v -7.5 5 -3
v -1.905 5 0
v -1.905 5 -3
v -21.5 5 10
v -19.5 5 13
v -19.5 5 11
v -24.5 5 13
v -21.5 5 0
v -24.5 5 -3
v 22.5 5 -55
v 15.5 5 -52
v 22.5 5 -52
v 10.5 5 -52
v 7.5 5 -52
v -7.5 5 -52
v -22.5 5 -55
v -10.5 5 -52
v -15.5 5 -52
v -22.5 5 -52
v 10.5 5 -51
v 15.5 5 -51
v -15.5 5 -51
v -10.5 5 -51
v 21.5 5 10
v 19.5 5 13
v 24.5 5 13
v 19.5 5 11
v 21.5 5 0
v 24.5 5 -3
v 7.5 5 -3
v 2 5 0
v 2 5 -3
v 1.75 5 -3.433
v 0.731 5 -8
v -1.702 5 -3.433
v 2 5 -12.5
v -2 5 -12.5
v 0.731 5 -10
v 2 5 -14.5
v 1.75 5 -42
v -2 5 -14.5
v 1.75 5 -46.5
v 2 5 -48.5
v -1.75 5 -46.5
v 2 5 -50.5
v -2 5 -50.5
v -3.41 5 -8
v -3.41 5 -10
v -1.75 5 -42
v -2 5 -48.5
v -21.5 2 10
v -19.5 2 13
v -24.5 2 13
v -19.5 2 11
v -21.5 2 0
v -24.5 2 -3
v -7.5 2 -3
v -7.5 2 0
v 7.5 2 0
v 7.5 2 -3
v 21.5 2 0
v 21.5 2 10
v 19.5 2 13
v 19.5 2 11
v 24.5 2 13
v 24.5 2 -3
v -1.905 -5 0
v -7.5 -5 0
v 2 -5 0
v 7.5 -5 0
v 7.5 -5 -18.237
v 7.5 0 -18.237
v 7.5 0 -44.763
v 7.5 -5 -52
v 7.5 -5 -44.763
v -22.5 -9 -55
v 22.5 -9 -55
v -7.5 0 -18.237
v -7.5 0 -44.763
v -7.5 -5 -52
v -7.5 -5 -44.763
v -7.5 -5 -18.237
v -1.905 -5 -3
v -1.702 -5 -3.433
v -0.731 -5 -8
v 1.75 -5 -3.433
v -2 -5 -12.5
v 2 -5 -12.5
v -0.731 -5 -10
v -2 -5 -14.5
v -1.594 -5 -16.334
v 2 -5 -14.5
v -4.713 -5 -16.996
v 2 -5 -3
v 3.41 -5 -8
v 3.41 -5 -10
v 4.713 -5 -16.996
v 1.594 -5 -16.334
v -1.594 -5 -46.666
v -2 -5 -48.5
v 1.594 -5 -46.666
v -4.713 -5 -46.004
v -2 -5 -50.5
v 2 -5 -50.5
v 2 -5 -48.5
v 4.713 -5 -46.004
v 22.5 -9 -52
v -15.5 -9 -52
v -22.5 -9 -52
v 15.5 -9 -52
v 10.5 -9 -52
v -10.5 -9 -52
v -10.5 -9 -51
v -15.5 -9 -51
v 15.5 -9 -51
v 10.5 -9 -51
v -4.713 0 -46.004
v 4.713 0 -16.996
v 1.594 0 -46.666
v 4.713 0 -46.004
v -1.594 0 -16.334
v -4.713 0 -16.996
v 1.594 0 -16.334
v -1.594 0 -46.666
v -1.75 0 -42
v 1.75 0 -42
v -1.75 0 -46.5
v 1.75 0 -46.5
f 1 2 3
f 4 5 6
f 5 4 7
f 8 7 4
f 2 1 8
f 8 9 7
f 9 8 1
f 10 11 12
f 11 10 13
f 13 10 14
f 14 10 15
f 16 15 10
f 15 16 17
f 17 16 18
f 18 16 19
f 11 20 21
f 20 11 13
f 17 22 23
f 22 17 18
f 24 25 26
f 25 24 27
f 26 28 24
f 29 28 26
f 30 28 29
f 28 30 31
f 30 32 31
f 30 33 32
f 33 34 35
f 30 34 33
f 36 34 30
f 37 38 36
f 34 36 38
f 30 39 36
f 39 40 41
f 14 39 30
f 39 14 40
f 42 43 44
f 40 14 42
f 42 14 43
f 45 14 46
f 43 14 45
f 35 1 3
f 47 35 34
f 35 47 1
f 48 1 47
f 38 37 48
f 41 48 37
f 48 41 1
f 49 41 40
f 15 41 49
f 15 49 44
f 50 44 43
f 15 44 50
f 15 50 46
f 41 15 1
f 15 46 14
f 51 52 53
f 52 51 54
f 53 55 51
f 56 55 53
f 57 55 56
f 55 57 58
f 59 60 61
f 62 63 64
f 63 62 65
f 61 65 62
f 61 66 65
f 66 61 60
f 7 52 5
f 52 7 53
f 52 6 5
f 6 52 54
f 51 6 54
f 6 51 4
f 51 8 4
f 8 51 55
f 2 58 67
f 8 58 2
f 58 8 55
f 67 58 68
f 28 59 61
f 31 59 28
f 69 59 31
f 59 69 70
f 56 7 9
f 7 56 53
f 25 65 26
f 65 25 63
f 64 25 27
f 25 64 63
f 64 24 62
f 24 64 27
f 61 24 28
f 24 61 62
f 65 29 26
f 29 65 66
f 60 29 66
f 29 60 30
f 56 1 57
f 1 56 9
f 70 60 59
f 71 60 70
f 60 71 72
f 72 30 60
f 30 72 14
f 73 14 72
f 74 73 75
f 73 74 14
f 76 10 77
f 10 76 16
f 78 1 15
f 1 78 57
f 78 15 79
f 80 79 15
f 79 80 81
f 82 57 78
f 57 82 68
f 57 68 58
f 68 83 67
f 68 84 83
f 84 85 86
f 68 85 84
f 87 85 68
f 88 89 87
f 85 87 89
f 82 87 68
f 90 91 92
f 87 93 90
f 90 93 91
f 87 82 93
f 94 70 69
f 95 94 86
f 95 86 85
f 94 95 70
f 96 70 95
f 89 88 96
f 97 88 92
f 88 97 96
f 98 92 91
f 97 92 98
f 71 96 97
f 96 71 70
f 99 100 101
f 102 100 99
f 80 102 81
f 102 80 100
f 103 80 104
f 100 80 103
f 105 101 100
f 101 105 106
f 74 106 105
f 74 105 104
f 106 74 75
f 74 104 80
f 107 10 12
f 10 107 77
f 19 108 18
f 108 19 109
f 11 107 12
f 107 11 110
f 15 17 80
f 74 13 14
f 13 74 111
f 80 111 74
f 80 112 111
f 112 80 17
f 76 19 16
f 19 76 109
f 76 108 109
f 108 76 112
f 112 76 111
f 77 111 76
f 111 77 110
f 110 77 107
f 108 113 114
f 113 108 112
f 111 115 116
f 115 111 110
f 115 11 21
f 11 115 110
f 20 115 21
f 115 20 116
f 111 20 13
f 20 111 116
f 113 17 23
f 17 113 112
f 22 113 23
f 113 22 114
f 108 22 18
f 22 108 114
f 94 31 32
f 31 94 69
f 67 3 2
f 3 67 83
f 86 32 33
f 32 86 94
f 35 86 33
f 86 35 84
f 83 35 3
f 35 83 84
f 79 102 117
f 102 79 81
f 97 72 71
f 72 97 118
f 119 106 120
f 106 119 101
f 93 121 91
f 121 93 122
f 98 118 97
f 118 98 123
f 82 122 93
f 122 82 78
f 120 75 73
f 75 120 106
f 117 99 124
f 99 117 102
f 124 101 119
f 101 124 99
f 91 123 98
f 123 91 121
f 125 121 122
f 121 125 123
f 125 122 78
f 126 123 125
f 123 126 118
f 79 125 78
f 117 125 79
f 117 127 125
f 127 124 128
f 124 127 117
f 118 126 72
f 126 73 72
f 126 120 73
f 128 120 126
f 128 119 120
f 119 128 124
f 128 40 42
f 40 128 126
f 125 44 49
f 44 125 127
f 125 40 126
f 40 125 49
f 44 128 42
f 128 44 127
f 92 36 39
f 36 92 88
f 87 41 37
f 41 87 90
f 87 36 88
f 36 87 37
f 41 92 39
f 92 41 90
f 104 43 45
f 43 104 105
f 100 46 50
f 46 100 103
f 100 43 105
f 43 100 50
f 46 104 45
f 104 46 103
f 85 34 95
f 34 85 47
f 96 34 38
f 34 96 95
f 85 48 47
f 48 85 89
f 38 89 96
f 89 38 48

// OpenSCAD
module compass(){
	translate([-43/2,-43/2,0])
		cube([43,43,10]);
	translate([-38/2,-38/2,0])
		cube([38,38,15]);
}
module buegel(){
	mirror([1,0,0])
		halter();
	halter();
	translate([49/-2,3/-2,-3])
		cube([49,3,3]);	//difference(){
	//	translate([50/-2,3/-2,-2.5])
	//		cube([50,3,15]);
	//	compass();
	//}
}
module buegel_quer(){
	rotate([0,0,90])
		buegel();
	translate([0,0,-3+0.01])
		rotate([90,0,90])
			translate([0,0,-1.5])
			linear_extrude(height=3)
				polygon([[-4,0],[4,0],[0,-3],[4,0]]);
}

module buzzer(){
	cylinder(r=30.5/2,h=5.2);
	translate([3.5/-2,-15,-15+0.01])
		cube([3.5,4.5,15]);
	translate([-2,17,-20])
		cube([4,2,40]);
	translate([-2,-19,-20])
		cube([4,2,40]);

}

module stand(h){
	difference(){
		union(){
			translate([15/-2,10/-2,-h])
				cube([15,10,h]);
			translate([0,3.5,0])
				buegel();
			translate([45/-2,10/2-14,-h])
				cube([45,14,3]);
			translate([15/2+3,10/2-14,-h+2])
				cube([5,14,2]);
			translate([15/-2-3-5,10/2-14,-h+2])
				cube([5,14,2]);
		}
		minkowski(){
			buegel_quer();
			sphere(r=0.5);
		}
		rotate([0,0,15])
			translate([4/-2,40/-2,-10])
				cube([4,40,2]);
		translate([0,0,-h/2-4])
			rotate([90,0,0])
				buzzer();
	}
}
module halter(){
	translate([43/2,0,0])
	rotate([90,0,0])
		translate([0,0,-1.5])
			linear_extrude(height=3){
				polygon([[0,0],[0,10],[-2,11],[-2,13],[3,13],[3,0],[0,0]]);
			}
}

//buegel();
stand(h=55);
//buegel_quer();

//buzzer();
